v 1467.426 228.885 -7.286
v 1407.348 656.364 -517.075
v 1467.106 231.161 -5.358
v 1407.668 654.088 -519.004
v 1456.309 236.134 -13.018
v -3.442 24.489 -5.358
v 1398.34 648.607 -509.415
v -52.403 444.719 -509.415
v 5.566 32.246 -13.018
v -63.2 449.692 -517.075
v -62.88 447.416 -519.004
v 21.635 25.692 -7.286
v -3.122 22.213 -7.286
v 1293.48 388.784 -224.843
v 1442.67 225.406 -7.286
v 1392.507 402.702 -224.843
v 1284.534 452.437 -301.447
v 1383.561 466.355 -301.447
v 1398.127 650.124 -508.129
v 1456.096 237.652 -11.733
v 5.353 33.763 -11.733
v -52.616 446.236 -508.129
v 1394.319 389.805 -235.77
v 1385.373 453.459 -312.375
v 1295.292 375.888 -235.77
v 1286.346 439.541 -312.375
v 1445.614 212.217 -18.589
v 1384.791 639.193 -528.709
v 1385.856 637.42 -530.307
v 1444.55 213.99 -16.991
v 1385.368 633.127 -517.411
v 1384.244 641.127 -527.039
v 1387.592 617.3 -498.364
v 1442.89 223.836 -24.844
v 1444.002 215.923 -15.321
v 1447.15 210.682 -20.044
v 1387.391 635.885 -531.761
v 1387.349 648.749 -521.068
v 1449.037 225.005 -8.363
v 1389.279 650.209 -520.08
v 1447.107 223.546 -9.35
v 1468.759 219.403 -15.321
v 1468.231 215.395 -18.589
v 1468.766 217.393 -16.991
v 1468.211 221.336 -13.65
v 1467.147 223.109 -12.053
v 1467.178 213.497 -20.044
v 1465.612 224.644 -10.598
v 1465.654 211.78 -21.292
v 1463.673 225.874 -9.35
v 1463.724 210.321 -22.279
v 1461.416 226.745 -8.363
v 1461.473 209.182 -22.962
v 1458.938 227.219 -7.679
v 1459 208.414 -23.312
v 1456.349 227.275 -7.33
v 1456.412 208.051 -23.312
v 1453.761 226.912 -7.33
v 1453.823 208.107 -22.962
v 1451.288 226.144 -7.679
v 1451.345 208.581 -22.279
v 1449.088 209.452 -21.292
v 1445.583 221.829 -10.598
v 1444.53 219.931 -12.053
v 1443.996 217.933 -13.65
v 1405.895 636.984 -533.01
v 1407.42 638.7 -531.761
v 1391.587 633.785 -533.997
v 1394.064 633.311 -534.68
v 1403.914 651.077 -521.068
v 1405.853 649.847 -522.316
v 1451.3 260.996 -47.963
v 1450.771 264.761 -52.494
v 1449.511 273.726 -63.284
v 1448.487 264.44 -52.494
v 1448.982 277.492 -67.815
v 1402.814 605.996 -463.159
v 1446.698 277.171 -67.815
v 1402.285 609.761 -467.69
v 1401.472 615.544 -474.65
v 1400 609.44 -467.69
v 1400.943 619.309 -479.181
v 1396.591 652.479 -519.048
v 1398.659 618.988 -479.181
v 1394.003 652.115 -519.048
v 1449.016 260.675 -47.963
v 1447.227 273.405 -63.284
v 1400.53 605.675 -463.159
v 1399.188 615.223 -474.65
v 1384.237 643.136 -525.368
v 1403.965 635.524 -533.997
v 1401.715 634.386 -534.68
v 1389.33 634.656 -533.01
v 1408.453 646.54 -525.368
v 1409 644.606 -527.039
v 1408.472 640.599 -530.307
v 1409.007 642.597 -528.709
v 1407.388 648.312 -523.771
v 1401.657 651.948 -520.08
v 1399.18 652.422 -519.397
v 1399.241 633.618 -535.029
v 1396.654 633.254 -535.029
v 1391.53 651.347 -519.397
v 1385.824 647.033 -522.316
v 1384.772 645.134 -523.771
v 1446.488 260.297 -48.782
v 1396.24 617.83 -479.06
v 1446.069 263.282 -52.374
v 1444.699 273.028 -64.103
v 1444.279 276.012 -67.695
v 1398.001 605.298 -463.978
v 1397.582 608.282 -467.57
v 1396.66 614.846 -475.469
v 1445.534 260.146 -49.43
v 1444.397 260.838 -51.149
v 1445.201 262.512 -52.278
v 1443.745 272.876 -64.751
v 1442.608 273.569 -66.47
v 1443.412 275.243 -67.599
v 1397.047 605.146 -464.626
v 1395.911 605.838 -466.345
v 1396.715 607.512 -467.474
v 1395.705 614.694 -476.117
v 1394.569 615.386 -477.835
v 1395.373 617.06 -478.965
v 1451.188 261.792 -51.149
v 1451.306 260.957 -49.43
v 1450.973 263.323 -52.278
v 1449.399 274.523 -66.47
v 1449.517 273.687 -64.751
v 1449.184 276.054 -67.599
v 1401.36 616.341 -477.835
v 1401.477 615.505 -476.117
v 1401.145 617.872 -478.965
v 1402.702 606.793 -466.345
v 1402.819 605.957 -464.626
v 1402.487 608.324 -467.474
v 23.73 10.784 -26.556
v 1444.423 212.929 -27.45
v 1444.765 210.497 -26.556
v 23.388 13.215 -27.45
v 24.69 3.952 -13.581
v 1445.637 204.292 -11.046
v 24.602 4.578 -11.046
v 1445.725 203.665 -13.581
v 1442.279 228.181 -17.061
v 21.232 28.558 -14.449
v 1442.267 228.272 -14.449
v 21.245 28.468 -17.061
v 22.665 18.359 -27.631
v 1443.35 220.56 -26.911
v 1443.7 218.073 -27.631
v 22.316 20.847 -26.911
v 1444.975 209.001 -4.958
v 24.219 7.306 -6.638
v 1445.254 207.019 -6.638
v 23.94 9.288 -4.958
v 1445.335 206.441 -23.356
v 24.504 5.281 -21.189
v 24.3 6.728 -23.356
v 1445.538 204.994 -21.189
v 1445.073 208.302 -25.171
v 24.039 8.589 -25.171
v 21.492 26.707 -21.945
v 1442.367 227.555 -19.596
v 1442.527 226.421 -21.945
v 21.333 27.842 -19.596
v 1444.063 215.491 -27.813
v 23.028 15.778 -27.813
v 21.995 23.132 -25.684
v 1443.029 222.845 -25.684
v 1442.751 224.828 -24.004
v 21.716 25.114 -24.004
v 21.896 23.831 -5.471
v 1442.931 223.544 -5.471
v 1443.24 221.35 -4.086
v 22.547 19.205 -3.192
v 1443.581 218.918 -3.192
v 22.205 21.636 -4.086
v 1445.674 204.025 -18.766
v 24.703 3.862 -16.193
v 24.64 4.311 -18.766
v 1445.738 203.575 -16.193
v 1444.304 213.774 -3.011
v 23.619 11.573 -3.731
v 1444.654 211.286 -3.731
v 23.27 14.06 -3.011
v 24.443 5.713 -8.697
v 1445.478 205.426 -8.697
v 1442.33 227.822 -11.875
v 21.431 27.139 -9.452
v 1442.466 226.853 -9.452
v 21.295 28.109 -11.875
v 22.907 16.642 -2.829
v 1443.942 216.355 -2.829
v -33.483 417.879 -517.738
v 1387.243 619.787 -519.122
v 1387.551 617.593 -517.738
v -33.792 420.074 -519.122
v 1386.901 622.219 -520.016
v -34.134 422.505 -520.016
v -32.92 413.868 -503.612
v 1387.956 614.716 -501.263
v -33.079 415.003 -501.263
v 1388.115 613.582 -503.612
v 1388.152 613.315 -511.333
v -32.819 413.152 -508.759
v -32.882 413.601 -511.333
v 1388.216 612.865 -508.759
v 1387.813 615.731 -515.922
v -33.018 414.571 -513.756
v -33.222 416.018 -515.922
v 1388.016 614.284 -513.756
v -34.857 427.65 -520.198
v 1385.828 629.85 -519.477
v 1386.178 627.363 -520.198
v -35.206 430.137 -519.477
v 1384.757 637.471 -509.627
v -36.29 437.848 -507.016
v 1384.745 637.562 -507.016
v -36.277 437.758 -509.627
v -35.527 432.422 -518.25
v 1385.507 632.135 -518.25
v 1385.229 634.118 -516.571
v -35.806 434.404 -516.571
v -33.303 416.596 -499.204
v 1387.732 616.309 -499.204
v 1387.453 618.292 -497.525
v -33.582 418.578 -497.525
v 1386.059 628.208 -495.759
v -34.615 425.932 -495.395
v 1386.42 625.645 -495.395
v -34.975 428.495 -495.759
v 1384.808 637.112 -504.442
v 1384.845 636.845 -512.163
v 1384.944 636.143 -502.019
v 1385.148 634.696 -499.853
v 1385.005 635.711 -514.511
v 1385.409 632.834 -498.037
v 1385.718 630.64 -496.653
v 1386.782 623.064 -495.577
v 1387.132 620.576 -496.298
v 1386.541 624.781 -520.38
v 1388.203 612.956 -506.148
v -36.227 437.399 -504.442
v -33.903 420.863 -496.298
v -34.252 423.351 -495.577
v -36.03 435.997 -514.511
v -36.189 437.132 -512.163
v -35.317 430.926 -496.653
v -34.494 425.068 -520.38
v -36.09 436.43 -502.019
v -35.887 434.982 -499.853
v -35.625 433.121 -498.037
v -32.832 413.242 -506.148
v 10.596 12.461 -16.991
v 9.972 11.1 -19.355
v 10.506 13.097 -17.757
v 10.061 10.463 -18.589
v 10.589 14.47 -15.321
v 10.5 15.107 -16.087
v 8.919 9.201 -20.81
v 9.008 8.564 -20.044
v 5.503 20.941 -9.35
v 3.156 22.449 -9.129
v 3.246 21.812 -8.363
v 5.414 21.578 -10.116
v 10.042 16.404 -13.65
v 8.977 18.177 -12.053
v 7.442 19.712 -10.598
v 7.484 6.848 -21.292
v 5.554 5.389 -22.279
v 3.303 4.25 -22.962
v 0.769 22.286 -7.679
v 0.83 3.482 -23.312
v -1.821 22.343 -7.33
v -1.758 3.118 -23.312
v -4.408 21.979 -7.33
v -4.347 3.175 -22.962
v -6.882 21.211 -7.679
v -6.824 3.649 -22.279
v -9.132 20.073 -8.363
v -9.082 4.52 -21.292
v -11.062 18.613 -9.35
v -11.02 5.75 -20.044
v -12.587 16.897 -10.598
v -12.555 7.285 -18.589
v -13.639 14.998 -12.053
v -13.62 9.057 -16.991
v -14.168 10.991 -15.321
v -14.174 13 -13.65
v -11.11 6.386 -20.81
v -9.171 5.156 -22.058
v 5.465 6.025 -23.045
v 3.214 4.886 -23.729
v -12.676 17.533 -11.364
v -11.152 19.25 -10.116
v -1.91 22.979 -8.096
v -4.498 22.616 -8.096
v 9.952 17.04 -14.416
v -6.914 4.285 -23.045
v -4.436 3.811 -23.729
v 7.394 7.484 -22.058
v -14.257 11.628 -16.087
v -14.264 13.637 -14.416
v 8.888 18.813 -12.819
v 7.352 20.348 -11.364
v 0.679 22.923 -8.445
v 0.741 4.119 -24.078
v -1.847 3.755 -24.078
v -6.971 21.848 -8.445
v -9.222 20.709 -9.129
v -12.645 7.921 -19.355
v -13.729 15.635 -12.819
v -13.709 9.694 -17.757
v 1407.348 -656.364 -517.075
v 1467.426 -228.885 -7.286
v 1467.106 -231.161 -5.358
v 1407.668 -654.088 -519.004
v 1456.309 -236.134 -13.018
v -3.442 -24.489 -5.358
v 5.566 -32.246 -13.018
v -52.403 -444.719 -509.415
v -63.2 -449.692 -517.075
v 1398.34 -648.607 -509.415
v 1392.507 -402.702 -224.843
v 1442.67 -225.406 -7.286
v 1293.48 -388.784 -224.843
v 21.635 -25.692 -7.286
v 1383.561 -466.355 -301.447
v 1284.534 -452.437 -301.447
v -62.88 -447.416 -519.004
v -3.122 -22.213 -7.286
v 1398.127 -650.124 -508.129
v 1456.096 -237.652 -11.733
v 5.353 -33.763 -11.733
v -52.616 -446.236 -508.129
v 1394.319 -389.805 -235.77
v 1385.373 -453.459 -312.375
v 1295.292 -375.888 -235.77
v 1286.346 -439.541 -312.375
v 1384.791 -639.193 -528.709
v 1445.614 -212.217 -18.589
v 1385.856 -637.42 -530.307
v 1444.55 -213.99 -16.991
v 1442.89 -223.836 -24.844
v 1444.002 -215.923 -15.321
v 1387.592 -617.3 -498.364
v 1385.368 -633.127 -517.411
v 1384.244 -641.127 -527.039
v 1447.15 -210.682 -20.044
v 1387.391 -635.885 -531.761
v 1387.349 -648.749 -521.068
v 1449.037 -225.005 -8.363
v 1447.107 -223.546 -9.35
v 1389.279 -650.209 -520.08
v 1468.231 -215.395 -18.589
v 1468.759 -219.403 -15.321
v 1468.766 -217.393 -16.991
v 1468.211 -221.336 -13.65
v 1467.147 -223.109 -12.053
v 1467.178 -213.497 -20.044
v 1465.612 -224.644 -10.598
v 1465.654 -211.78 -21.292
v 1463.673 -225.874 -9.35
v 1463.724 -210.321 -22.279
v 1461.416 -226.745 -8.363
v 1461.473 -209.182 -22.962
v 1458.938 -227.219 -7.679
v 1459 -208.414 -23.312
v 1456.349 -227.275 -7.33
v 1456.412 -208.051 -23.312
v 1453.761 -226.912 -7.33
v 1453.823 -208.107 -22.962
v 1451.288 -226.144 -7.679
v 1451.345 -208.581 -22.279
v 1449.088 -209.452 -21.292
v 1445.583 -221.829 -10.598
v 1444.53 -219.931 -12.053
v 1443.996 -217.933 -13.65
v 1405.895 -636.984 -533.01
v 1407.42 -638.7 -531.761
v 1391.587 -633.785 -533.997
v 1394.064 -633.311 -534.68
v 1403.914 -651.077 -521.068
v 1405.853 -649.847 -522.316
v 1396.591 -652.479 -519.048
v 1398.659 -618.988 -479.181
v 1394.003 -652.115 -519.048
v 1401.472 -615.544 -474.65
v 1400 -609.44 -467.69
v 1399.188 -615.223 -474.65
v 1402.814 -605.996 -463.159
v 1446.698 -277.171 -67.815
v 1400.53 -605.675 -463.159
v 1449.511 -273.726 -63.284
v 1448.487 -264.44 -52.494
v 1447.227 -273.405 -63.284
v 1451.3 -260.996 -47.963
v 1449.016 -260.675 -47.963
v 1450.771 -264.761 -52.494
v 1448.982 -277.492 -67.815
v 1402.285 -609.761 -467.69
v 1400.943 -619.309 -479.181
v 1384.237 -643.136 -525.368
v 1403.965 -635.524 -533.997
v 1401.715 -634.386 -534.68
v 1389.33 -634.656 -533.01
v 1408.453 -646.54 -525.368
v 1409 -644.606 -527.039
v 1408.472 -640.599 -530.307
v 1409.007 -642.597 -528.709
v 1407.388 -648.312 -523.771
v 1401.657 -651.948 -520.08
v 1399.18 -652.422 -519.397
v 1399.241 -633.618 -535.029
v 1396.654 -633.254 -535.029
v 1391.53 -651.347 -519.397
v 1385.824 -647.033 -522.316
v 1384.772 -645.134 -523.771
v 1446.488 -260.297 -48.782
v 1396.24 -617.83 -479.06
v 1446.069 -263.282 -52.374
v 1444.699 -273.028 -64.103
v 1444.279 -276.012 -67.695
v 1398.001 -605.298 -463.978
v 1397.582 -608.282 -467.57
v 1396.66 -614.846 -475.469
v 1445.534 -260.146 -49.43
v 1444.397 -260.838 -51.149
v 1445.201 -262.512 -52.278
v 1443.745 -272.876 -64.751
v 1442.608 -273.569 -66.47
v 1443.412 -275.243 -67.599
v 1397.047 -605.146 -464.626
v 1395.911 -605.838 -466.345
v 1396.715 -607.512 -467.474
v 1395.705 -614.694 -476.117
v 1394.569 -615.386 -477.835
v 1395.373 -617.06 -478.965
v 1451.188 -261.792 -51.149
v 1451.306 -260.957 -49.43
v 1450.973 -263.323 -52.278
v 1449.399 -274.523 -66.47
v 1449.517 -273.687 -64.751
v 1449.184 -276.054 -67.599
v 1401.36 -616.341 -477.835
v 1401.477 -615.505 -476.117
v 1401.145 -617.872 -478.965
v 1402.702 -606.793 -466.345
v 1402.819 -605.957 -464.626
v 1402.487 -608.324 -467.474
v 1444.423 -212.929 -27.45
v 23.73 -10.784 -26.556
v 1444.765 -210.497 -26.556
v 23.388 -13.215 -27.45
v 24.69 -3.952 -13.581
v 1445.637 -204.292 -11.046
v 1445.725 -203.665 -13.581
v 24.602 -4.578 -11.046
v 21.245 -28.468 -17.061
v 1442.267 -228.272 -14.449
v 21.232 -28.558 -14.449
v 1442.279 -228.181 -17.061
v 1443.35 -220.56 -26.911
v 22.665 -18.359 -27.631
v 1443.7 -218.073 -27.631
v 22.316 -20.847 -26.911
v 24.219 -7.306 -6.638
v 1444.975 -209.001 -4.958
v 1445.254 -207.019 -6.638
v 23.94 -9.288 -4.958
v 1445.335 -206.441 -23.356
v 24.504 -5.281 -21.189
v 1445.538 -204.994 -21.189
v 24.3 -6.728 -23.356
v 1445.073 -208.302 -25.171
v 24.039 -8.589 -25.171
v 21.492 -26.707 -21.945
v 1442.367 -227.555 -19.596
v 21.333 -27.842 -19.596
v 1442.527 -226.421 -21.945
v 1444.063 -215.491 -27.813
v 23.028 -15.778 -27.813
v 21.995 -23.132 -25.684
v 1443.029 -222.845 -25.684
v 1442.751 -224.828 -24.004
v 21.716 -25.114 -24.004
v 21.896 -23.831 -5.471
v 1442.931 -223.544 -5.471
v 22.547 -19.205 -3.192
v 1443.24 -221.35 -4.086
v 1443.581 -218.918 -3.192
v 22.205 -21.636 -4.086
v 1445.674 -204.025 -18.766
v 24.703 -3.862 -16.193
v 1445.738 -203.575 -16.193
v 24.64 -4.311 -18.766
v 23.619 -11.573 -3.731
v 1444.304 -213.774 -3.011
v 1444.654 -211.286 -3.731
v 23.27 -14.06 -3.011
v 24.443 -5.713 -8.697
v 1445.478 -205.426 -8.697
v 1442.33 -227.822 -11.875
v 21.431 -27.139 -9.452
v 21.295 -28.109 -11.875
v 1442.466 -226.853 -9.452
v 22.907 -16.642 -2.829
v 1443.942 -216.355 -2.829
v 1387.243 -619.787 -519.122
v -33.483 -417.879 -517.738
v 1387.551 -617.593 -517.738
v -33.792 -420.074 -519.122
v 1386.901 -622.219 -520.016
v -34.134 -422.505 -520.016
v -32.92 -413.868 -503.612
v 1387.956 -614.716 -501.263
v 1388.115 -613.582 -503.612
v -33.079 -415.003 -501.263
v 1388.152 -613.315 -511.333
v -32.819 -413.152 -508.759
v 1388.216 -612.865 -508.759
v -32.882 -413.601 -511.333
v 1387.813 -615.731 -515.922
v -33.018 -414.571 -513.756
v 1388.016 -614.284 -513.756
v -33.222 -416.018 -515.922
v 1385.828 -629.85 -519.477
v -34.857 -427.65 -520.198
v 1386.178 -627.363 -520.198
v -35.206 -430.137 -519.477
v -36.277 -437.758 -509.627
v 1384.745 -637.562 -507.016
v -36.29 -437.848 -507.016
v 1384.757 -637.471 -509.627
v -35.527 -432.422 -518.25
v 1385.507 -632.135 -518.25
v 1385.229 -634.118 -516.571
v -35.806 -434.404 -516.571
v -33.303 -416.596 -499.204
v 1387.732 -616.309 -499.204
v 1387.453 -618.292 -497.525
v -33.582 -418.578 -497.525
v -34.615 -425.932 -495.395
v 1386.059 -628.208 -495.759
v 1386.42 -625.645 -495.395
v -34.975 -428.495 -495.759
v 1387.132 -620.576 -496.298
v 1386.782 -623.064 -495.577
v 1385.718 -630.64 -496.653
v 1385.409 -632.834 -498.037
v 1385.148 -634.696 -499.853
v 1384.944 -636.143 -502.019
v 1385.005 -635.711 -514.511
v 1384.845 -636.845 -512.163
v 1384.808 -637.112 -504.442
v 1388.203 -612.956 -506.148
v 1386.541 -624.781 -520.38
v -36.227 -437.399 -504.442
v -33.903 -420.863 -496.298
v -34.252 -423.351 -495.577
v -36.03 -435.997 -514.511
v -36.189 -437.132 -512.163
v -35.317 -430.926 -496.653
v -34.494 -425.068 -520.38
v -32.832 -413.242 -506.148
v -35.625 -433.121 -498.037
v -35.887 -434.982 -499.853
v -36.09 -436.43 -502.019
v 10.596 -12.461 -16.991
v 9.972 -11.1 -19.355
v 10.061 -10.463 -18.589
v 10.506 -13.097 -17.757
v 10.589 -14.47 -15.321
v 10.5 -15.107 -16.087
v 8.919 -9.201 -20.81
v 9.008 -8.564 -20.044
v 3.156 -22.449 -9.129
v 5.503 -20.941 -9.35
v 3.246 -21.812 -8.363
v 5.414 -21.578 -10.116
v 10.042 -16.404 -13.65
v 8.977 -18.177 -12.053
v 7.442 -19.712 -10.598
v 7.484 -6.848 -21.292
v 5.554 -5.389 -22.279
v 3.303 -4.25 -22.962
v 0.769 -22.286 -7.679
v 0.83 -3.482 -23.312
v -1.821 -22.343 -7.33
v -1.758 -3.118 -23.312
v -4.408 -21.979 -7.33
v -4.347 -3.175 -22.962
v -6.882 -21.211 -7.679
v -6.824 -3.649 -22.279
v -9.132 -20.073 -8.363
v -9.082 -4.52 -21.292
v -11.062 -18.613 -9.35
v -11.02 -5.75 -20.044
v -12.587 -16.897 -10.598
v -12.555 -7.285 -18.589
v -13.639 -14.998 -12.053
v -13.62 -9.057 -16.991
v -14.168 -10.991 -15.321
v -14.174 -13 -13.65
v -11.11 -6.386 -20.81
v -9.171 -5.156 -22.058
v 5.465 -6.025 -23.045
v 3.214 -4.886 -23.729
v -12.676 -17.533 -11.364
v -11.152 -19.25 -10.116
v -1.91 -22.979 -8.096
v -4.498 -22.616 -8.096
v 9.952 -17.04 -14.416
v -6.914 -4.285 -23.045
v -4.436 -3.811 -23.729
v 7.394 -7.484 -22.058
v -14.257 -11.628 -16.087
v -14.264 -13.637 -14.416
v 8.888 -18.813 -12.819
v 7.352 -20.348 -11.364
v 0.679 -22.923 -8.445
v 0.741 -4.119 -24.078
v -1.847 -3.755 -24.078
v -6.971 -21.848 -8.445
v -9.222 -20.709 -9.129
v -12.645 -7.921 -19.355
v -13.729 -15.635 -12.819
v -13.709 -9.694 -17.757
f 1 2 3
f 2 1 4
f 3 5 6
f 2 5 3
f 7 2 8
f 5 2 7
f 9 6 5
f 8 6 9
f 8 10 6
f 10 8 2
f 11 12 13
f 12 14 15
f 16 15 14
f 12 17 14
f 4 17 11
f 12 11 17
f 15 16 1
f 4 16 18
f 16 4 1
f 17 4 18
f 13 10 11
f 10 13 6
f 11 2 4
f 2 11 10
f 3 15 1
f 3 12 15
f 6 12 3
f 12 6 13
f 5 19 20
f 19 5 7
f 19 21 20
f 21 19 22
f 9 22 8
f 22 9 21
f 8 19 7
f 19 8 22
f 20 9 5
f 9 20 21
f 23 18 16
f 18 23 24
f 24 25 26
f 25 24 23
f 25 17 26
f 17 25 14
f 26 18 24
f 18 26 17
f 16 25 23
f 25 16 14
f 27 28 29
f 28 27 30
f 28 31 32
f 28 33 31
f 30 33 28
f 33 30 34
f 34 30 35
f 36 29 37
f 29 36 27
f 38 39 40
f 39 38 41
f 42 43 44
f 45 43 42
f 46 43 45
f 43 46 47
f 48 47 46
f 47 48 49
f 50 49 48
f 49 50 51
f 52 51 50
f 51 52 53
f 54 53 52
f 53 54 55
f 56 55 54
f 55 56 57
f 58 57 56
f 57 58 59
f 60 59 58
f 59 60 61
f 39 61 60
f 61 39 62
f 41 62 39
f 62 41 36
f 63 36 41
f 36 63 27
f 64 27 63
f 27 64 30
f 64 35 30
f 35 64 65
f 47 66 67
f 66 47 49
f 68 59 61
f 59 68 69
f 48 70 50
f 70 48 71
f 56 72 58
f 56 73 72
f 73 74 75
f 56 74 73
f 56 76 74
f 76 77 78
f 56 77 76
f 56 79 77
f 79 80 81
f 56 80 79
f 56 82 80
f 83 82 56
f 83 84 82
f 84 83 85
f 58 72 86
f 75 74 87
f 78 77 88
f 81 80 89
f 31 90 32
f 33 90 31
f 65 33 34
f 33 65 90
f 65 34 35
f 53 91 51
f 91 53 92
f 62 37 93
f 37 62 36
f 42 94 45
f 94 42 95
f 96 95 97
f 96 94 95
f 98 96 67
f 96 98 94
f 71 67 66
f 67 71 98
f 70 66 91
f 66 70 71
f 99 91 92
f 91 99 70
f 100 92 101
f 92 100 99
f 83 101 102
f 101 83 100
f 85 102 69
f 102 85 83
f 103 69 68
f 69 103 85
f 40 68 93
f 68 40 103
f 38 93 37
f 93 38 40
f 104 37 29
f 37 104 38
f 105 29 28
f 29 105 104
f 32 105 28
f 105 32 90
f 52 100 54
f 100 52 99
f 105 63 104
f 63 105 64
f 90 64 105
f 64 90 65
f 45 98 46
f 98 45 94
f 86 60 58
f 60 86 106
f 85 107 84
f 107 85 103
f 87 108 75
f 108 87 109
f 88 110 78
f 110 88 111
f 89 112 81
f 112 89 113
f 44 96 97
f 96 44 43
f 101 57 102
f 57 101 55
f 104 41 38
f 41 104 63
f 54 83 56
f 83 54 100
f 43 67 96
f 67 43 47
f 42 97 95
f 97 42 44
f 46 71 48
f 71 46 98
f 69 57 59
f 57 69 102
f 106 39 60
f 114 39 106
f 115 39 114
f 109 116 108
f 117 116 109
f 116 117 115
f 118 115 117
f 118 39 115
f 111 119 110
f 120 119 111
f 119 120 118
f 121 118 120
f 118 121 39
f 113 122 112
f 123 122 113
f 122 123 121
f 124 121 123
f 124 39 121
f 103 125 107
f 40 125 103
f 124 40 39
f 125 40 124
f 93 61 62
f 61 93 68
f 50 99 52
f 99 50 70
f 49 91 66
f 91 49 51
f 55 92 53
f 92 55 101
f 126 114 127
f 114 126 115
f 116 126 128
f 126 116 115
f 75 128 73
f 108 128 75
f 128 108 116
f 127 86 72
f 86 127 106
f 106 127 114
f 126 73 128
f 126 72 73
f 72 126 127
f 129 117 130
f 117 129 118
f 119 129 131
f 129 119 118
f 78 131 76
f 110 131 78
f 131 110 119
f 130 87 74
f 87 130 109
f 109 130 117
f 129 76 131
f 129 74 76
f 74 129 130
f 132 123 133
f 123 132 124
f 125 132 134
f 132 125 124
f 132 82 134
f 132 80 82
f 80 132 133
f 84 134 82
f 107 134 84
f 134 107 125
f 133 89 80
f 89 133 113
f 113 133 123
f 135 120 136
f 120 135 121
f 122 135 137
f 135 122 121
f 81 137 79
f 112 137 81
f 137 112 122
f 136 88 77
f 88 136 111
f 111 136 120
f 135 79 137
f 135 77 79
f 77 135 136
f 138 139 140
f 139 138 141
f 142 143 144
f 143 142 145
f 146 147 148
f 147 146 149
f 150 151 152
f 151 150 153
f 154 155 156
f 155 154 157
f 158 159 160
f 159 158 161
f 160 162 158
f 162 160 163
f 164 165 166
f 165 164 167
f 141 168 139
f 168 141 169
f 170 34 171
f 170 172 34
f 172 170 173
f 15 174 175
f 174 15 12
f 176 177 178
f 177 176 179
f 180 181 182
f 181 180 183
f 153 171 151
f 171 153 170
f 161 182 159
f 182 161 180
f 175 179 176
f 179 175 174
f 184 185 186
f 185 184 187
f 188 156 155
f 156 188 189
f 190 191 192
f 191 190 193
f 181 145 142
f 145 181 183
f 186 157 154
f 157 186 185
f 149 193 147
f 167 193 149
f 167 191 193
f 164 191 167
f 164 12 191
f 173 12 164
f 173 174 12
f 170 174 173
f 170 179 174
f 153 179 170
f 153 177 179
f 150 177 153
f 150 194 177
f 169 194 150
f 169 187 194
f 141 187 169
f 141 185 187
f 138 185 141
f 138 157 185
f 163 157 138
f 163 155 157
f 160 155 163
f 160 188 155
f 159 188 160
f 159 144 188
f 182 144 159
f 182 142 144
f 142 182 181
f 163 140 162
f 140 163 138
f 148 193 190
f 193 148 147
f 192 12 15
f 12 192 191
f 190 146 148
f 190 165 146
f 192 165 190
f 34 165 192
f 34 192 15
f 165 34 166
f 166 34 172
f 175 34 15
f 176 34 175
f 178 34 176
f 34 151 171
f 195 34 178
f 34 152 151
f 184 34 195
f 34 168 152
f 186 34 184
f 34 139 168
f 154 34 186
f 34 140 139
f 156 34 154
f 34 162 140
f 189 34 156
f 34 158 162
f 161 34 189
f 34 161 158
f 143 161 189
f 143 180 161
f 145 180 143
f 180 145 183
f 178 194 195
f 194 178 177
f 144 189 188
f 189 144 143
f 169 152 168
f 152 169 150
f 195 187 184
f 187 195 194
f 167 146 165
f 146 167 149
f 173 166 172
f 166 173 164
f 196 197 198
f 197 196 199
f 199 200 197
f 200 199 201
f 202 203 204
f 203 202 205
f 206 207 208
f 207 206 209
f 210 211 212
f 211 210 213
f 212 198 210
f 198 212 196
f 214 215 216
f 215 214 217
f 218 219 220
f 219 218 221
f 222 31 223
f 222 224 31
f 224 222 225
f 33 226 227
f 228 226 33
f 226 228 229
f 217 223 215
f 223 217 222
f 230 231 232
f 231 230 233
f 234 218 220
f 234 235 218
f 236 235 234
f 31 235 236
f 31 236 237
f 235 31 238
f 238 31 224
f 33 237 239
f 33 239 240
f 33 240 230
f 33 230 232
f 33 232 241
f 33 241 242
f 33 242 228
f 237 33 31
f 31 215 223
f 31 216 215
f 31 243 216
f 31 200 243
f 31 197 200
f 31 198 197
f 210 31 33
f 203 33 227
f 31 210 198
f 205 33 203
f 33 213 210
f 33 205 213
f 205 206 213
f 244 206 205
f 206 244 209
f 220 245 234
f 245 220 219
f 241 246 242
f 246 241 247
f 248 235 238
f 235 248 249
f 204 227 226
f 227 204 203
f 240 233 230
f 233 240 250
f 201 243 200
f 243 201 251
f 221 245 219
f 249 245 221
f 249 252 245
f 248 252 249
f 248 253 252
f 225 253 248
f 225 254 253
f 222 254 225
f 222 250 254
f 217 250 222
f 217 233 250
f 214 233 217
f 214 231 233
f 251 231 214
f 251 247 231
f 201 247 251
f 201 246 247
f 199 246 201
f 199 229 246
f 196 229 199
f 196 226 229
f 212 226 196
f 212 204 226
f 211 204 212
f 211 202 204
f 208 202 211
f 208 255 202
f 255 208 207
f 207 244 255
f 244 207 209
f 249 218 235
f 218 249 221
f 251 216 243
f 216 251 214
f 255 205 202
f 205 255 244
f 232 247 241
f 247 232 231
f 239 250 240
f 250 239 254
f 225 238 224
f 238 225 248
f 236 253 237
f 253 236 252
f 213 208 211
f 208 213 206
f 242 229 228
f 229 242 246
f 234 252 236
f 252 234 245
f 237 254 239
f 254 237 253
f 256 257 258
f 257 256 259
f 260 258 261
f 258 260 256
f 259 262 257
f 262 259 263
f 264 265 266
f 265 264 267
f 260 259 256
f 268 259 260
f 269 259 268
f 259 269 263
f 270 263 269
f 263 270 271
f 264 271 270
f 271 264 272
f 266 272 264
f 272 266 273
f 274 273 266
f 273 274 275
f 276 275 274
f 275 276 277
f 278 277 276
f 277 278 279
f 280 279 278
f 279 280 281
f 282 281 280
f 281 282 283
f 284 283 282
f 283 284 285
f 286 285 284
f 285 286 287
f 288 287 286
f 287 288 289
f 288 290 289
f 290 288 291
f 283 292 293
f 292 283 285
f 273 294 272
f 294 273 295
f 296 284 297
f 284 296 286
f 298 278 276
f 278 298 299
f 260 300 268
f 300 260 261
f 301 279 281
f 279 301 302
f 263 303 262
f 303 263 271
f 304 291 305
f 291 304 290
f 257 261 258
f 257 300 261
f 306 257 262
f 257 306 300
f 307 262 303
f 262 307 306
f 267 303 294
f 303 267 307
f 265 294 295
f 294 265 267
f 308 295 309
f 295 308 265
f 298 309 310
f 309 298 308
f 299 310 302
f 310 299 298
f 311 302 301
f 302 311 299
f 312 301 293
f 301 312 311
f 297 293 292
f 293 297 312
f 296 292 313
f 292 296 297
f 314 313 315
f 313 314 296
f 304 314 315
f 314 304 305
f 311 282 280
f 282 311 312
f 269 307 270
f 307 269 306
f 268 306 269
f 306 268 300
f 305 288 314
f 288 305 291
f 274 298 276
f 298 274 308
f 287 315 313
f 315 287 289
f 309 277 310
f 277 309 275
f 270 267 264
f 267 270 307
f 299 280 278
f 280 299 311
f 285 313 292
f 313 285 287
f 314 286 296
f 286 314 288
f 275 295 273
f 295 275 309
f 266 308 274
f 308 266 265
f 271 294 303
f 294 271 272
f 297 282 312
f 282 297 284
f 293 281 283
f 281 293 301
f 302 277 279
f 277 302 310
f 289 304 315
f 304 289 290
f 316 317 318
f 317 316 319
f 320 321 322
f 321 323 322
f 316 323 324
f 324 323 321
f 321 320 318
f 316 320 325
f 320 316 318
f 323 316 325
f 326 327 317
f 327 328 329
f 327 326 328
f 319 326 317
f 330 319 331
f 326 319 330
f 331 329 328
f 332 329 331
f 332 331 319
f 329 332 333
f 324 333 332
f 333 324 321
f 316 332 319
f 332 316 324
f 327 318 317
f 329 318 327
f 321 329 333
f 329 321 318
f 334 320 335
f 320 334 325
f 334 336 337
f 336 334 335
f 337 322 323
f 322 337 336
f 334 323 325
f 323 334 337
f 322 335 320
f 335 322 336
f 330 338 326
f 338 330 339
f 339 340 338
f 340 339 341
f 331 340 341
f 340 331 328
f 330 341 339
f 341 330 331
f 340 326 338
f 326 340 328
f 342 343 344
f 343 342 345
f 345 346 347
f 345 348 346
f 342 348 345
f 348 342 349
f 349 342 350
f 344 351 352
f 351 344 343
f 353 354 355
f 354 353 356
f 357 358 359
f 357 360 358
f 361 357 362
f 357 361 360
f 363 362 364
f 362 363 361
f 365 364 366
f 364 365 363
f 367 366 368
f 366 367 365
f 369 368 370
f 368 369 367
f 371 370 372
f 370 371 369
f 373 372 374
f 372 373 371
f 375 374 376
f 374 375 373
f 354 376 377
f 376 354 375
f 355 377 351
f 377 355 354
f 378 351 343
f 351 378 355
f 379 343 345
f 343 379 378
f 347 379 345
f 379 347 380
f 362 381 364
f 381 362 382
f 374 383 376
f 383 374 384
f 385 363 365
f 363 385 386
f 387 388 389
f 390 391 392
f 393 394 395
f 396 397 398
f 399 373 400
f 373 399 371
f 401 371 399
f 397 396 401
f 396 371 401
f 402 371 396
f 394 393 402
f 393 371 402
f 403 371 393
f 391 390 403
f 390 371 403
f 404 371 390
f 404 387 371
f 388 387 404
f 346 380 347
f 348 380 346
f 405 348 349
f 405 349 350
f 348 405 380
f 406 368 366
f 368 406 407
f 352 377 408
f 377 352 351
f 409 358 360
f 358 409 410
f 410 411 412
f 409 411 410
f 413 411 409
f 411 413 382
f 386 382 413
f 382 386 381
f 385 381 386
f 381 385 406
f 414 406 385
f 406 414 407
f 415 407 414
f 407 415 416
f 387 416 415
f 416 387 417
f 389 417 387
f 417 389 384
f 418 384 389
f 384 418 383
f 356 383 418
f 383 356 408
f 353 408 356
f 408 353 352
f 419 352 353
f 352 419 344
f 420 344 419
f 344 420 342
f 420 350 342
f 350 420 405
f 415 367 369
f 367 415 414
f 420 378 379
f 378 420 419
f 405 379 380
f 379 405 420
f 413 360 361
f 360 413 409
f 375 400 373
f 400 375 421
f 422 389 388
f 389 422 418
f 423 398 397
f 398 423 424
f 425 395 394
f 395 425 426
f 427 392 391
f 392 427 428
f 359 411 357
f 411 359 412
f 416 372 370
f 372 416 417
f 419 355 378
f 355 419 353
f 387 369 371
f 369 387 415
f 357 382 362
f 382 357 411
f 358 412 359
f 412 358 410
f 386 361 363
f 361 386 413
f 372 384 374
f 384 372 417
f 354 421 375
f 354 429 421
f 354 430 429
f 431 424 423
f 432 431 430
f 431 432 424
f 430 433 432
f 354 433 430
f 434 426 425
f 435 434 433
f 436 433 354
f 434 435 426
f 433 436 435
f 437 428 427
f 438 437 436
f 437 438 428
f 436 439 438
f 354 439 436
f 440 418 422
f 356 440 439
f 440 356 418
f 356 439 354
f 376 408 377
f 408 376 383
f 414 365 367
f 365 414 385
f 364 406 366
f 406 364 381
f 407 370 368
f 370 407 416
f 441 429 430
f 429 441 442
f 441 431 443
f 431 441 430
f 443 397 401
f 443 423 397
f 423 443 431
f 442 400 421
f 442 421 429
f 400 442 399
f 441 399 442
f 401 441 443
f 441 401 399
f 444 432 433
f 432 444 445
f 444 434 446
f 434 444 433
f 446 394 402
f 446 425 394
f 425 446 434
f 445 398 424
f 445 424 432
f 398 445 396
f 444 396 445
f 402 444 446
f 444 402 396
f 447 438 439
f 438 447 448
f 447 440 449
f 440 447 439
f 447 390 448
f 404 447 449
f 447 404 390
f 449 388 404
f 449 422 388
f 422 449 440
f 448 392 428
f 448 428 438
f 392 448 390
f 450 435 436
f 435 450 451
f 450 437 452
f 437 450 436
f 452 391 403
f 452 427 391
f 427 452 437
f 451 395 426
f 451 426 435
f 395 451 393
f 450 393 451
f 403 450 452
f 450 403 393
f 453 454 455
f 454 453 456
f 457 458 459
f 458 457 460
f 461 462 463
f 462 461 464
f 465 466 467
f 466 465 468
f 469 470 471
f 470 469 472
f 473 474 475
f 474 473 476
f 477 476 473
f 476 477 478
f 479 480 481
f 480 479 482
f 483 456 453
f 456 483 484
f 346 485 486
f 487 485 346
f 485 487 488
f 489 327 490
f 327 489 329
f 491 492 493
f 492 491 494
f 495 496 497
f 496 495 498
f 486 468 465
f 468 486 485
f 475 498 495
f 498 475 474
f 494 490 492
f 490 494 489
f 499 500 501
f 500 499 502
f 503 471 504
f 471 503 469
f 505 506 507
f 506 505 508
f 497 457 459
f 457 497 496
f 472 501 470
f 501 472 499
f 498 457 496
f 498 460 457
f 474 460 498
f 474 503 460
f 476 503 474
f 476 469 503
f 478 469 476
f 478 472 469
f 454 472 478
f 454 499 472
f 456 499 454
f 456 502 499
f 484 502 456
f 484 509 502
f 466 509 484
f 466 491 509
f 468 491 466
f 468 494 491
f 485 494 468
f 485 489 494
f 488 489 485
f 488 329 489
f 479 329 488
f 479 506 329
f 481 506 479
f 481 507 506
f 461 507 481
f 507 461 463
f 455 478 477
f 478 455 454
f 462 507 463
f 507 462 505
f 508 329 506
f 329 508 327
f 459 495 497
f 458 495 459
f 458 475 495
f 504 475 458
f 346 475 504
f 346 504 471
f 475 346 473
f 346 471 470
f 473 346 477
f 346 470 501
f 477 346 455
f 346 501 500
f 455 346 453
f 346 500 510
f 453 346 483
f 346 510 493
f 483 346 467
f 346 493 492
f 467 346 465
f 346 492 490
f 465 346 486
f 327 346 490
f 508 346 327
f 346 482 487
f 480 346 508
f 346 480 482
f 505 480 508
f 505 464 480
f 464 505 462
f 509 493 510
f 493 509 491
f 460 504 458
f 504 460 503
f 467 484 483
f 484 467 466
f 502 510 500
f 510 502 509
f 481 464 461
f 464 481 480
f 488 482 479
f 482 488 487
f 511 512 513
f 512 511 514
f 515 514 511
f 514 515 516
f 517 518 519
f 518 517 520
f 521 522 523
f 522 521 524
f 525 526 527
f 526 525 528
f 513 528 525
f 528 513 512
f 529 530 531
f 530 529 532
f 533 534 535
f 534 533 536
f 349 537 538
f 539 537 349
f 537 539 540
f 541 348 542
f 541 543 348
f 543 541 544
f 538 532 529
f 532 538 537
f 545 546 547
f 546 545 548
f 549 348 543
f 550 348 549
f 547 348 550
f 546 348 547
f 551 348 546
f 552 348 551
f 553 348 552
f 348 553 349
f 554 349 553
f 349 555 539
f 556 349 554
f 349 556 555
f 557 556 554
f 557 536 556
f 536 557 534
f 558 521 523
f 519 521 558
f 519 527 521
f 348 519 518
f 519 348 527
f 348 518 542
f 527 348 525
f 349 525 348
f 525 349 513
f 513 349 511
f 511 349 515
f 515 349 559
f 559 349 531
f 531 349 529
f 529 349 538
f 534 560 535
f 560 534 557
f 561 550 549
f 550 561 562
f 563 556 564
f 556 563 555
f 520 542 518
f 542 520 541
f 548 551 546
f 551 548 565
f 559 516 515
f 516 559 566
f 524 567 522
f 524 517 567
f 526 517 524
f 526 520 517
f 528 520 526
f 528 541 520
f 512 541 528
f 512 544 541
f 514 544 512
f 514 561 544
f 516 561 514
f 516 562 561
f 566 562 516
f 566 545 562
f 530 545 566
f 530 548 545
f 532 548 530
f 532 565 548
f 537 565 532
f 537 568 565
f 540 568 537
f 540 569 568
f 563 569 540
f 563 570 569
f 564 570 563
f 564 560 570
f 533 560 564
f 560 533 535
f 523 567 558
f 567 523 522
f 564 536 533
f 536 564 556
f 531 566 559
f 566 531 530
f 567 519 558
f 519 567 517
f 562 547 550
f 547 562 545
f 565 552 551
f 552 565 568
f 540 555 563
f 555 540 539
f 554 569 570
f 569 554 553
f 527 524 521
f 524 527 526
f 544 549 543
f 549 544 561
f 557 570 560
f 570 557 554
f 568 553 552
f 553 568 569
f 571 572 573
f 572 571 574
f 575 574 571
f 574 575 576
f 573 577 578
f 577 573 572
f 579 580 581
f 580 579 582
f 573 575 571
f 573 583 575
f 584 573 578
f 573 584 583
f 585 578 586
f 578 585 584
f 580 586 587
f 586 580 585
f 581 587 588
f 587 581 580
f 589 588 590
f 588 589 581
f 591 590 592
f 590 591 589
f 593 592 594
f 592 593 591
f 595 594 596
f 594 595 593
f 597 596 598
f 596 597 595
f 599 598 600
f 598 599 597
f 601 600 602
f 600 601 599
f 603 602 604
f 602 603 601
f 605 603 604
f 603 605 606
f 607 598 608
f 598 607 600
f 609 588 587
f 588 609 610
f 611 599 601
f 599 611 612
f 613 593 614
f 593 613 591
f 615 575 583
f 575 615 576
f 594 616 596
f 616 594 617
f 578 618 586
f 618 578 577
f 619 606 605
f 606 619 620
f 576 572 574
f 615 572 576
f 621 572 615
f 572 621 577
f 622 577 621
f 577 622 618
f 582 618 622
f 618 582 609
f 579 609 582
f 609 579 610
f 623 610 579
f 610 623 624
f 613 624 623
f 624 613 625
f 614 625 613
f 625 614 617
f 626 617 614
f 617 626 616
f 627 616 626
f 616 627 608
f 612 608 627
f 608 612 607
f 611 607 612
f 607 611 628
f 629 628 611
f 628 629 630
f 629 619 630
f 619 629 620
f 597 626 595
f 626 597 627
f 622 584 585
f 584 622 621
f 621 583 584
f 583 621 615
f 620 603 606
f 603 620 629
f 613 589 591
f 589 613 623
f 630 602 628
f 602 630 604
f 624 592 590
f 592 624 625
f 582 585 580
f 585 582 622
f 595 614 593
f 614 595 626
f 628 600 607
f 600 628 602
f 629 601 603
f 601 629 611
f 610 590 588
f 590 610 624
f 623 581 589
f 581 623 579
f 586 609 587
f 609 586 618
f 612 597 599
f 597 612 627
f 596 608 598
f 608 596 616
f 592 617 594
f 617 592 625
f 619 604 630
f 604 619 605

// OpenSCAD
// Solar Bear
// A solar-hybrid trike
// https://github.com/solar-b

// Maker: Mihai Oltean
// https://mihaioltean.github.io
// License: MIT

// last update 2026.9.6.1
//---------------------------------------------------------------------------------------
module solar_panel(panel_size)
{
    color("silver")
        cube(panel_size);
        
    translate([10, 10, panel_size[2]])
        color("black")
            cube([panel_size[0], panel_size[1], 2] - [20, 20, 0]);
            
// electric contact
    translate([panel_size[0] - 100 - 25 - 25, panel_size[1] / 2 - 50, panel_size[2] - 20])
        color("black")
            cube([100, 100, 20]);
}
//---------------------------------------------------------------------------------------
module solar_panel_with_support(
    panel_size, 
    bar_offset_left_bottom = 0, 
    bar_offset_left_top = 0, 
    bar_offset_right_bottom = 0, 
    bar_offset_right_top = 0, 
    show_panels = true)
{
    if (show_panels == true)
        translate([0, 0, 12.5])
			solar_panel(panel_size);        
    
// frame, on length

    translate([25, 0, 0])
        rotate([0, 90, 0])
        color("Silver") 
            cylinder(h = panel_size[0] - 50, r = 12.5)
        ;
// other length
    translate([25, panel_size[1] - 25, 0])
        rotate([0, 90, 0])
        color("Silver") 
            cylinder(h = panel_size[0] - 50, r = 12.5);
    
// frame on width    
// left side
    translate ([12.5, -bar_offset_left_bottom, 0]) 
    rotate([-90, 0, 0])
            cylinder(h = panel_size[1] + bar_offset_left_bottom + bar_offset_left_top, r = 12.5);//30, 25, 50, 50)// these values are hard-coded
    ;
// right side        
    translate ([panel_size[0]-12.5, -bar_offset_right_bottom, 0]) 
        mirror([1, 0, 0])
            difference(){
            rotate([-90, 0, 0])
                cylinder(h = panel_size[1] + bar_offset_right_bottom + bar_offset_right_top, r = 12.5);
                
                translate([-1, 56, 15])
                    rotate([0, 90, 0])
                        cylinder(h = 60, r = 4);
                translate([-1, 76, 15])
                    rotate([0, 90, 0])
                        cylinder(h = 50, r = 4);
// other side, bottom
                translate([-1, panel_size[1] - 55, 15])
                    rotate([0, 90, 0])
                        cylinder(h = 50, r = 4);
                translate([-1, panel_size[1] - 70, 15])
                    rotate([0, 90, 0])
                        cylinder(h = 50, r = 4);
            }
}
//---------------------------------------------------------------------------------------
module solar_panel_with_support_as_door(
                        panel_size, 
                        _door_angle = 0, 
                        bar_offset_left_bottom = 0, 
                        bar_offset_left_top = 0, 
                        bar_offset_right_bottom = 0, 
                        bar_offset_right_top = 0, 
                        show_panels = true)
{
    rotate([0, -_door_angle, 0])
        solar_panel_with_support(
            panel_size, 
            bar_offset_left_bottom, 
            bar_offset_left_top, 
            bar_offset_right_bottom, 
            bar_offset_right_top, 
            show_panels);           
}
//---------------------------------------------------------------------------------------
module solar_wing(
    angle, 
    panel_size, 
    angle2, 
    space, 
    open_door_angle, 
    offset_top, 
    offset_bottom, 
    show_panels = true)
{
    rotate([0, 0, angle2])
        rotate([-angle, 0, 0])
            translate([0, space, 0]) 
        
                solar_panel_with_support(
                    panel_size, 
                    bar_offset_left_bottom = offset_top, //52
                    bar_offset_left_top = offset_bottom, //100, 
                    bar_offset_right_bottom = 0, 
                    bar_offset_right_top = 0, 
                    show_panels);
        
    rotate([0, 0, -angle2])
        rotate([angle, 0, 0])
            translate([0, - space, 0])
            mirror([0, 1, 0])
                solar_panel_with_support_as_door(
                    panel_size,
                    open_door_angle,
                    bar_offset_left_bottom = offset_top, //52, 
                    bar_offset_left_top = offset_bottom, //100, 
                    bar_offset_right_bottom = 0, 
                    bar_offset_right_top = 0, 
                    show_panels);
}
//---------------------------------------------------------------------------------------

//solar_panel(solar_panel_front_size);

//solar_panel_with_enhanced_frame([1485, 668, 30]);

/*
solar_panel_with_support(panel_size = [1485, 668, 30], 
    _door_angle = 20, 
    bar_offset_left_bottom = 45, 
    bar_offset_left_top = 61, 
    bar_offset_right_bottom = 30, 
    bar_offset_right_top = 40);
*/

  
solar_wing(angle = 50, 
            panel_size=[1485, 668, 3], angle2 = 8, space = 20, open_door_angle = 0, offset_top = 45,  offset_bottom = 61 , $show_panels = true, $show_frame = true);

   
//solar_wing(50, [1485, 668, 30], angle2 = 8, space = 20, offset_bottom = 52, offset_top = 100, open_door_angle = 0);

//corner_25_25_3_with_holes(1000, 20, 50, 50);
//corner_30_30_3(1000);
